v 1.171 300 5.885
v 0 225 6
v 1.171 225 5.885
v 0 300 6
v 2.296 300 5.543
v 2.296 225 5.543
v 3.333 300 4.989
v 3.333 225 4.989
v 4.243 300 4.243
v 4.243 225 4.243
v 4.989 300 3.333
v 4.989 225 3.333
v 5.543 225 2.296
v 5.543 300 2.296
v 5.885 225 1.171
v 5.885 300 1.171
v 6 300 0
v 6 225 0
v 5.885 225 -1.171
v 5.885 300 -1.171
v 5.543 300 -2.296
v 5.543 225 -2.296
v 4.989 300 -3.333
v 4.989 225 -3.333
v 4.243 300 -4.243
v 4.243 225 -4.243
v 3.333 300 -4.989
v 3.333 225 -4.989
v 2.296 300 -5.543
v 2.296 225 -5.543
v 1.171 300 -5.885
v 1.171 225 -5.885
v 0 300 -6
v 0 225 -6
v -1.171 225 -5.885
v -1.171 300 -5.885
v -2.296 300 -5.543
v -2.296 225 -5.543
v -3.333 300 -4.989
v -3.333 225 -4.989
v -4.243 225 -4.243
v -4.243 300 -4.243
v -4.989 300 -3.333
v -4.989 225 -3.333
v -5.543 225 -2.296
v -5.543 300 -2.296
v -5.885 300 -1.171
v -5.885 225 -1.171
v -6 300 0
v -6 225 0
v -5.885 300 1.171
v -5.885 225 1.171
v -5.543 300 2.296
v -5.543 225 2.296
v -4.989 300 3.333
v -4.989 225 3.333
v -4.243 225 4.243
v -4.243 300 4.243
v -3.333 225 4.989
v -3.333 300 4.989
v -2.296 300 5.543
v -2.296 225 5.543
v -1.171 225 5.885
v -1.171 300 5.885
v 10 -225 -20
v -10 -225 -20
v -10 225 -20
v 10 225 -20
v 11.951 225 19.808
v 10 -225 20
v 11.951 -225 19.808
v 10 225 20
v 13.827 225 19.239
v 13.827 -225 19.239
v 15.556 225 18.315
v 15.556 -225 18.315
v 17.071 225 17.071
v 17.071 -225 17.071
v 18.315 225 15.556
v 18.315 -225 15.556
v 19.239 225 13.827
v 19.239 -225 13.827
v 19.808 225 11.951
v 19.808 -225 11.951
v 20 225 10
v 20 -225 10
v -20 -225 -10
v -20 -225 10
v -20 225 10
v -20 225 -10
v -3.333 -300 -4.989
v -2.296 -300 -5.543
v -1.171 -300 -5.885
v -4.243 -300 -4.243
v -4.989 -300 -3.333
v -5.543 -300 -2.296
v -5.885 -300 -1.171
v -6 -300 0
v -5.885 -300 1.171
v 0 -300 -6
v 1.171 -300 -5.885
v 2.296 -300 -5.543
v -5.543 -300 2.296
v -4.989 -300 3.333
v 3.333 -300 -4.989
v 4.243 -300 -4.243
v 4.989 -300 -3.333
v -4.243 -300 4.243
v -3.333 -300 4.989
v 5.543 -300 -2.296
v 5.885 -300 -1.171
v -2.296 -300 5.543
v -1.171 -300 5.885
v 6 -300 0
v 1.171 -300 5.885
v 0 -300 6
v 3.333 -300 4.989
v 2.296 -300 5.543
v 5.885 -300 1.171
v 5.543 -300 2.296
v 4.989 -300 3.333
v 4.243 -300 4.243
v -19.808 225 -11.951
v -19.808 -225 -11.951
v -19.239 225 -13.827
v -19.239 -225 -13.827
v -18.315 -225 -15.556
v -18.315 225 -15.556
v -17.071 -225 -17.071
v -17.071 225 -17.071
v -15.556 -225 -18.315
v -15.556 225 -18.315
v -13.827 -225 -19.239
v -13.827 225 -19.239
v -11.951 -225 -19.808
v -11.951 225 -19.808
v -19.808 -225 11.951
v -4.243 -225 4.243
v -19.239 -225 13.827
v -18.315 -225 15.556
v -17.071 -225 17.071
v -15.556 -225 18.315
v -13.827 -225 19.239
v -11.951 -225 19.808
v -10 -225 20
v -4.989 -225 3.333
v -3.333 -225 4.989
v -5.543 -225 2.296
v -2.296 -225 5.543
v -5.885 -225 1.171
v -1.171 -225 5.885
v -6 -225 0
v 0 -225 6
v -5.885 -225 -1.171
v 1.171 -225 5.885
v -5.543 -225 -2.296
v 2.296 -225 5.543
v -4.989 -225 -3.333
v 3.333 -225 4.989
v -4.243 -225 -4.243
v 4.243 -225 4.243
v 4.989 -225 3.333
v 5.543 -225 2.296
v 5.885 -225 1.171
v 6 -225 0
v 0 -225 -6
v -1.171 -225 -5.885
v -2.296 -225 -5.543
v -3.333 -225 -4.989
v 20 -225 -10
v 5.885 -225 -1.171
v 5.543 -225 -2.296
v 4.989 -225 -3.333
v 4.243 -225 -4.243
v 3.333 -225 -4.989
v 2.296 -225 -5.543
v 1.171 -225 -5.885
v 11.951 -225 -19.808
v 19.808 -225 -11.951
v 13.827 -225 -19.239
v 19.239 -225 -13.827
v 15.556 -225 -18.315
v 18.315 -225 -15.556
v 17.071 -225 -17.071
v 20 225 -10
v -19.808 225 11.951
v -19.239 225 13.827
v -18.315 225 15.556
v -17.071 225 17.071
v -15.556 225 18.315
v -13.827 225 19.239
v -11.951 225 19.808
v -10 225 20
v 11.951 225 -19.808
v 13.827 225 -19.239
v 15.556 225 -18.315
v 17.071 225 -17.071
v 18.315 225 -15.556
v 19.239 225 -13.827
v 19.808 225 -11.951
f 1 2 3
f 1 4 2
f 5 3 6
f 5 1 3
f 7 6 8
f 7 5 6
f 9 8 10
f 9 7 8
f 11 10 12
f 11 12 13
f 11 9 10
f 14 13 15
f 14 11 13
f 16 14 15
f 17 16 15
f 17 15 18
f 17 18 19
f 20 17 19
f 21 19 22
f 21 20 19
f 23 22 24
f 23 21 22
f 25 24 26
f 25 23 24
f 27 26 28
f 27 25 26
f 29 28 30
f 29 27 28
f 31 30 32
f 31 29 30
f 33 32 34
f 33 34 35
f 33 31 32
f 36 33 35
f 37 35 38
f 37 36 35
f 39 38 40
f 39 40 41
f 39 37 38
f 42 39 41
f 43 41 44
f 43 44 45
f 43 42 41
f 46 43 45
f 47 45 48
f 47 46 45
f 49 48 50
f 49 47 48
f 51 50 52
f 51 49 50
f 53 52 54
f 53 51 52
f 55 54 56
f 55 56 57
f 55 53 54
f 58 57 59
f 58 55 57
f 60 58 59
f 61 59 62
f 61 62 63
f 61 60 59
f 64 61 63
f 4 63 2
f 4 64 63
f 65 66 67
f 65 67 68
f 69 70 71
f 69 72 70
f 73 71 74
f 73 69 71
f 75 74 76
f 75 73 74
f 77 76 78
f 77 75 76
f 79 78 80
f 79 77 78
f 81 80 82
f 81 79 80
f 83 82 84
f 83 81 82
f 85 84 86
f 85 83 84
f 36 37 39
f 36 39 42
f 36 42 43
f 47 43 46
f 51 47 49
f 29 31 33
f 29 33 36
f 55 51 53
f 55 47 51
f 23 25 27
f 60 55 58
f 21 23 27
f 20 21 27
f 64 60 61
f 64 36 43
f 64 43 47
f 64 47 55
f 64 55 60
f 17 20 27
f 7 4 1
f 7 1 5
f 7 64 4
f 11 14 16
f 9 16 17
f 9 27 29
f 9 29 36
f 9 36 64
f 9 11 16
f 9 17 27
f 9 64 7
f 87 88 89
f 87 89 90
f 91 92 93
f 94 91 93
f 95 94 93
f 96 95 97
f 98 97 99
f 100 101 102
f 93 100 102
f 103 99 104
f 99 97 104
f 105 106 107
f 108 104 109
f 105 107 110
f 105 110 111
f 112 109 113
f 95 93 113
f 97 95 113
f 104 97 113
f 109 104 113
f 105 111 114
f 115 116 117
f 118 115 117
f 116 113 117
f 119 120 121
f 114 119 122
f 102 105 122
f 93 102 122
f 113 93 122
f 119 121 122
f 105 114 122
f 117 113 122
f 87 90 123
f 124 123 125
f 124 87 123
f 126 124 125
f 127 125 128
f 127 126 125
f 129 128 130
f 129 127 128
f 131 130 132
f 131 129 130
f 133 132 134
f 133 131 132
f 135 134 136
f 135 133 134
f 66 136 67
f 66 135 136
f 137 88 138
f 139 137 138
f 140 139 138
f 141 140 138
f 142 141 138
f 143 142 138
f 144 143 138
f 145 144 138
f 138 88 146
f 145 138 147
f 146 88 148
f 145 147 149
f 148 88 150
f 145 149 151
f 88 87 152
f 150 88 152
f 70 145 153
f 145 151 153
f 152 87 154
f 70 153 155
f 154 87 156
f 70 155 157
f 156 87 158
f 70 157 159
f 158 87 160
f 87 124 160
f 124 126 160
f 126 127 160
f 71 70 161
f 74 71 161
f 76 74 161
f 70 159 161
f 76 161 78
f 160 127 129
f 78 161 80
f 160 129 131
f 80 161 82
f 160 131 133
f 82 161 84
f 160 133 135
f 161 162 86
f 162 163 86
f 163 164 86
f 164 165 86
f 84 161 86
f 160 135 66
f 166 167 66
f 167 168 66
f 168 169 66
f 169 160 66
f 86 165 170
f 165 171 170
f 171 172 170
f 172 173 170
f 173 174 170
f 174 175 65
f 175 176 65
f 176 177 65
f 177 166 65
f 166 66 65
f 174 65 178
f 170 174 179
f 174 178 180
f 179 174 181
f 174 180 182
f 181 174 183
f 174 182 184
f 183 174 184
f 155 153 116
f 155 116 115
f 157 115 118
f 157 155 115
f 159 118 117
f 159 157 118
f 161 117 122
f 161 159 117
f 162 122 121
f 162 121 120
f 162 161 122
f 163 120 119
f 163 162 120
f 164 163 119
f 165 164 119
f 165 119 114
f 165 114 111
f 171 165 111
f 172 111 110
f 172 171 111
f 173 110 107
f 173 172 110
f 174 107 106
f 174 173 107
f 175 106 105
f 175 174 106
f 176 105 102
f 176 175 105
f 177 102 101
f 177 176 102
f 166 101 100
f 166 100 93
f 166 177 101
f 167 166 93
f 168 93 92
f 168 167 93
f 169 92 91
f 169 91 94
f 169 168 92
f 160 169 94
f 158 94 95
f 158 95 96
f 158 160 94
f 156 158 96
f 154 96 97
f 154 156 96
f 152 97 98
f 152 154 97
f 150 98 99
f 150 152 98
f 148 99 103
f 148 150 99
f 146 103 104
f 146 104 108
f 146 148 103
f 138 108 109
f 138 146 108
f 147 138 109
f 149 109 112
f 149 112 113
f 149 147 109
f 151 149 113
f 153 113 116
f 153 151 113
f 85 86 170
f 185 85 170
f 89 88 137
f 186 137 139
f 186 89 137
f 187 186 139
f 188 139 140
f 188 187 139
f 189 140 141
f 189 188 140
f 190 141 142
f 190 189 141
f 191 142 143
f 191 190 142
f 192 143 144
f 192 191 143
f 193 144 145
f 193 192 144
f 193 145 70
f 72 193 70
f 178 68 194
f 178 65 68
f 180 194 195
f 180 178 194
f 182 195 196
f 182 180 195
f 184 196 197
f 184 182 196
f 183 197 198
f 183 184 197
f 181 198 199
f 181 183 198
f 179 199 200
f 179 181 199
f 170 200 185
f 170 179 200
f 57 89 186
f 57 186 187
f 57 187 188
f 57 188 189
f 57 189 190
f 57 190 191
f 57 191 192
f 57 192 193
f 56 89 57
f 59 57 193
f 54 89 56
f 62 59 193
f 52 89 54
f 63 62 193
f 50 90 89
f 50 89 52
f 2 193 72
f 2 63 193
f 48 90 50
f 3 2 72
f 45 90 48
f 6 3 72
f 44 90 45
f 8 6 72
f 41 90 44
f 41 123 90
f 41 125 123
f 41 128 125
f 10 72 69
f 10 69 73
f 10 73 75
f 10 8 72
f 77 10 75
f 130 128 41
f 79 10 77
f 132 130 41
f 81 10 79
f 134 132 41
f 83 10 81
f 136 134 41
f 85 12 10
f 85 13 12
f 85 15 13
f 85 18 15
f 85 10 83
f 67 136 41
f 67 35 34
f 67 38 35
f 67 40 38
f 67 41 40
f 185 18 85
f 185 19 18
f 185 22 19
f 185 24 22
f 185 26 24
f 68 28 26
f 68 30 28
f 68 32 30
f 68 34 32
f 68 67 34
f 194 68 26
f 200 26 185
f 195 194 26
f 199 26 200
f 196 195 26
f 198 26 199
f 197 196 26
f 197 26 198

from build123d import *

# Parameters (mm, degrees)
SKETCH_1_R      = 6
EXTRUDE_1_DEPTH = 300
SKETCH_2_W      = 40
SKETCH_2_H      = 40
EXTRUDE_2_DEPTH = 225
FILLET_1_R      = 10


with BuildPart() as part:
    # 草图1 → 凸台-拉伸1 (new, symmetric)
    with BuildSketch(Plane(origin=(0, 0, 0), x_dir=(1, 0, 0), z_dir=(0, 1, 0))):
        with Locations(Location((0, 0, 0), (0, 0, 270))):
            Circle(SKETCH_1_R)
    extrude(amount=EXTRUDE_1_DEPTH, both=True)

    # 草图2 → 凸台-拉伸2 (add, symmetric)
    with BuildSketch(Plane(origin=(0, 0, 0), x_dir=(1, 0, 0), z_dir=(0, 1, 0))):
        Rectangle(SKETCH_2_W, SKETCH_2_H)
    extrude(amount=EXTRUDE_2_DEPTH, both=True)

    # 圆角1
    fillet_1_edges = [part.edges().sort_by_distance(p)[0] for p in [
        (20, 0, 20),
        (20, 0, -20),
        (-20, 0, -20),
        (-20, 0, 20),
    ]]
    fillet(fillet_1_edges, radius=FILLET_1_R)


solid = part.part
